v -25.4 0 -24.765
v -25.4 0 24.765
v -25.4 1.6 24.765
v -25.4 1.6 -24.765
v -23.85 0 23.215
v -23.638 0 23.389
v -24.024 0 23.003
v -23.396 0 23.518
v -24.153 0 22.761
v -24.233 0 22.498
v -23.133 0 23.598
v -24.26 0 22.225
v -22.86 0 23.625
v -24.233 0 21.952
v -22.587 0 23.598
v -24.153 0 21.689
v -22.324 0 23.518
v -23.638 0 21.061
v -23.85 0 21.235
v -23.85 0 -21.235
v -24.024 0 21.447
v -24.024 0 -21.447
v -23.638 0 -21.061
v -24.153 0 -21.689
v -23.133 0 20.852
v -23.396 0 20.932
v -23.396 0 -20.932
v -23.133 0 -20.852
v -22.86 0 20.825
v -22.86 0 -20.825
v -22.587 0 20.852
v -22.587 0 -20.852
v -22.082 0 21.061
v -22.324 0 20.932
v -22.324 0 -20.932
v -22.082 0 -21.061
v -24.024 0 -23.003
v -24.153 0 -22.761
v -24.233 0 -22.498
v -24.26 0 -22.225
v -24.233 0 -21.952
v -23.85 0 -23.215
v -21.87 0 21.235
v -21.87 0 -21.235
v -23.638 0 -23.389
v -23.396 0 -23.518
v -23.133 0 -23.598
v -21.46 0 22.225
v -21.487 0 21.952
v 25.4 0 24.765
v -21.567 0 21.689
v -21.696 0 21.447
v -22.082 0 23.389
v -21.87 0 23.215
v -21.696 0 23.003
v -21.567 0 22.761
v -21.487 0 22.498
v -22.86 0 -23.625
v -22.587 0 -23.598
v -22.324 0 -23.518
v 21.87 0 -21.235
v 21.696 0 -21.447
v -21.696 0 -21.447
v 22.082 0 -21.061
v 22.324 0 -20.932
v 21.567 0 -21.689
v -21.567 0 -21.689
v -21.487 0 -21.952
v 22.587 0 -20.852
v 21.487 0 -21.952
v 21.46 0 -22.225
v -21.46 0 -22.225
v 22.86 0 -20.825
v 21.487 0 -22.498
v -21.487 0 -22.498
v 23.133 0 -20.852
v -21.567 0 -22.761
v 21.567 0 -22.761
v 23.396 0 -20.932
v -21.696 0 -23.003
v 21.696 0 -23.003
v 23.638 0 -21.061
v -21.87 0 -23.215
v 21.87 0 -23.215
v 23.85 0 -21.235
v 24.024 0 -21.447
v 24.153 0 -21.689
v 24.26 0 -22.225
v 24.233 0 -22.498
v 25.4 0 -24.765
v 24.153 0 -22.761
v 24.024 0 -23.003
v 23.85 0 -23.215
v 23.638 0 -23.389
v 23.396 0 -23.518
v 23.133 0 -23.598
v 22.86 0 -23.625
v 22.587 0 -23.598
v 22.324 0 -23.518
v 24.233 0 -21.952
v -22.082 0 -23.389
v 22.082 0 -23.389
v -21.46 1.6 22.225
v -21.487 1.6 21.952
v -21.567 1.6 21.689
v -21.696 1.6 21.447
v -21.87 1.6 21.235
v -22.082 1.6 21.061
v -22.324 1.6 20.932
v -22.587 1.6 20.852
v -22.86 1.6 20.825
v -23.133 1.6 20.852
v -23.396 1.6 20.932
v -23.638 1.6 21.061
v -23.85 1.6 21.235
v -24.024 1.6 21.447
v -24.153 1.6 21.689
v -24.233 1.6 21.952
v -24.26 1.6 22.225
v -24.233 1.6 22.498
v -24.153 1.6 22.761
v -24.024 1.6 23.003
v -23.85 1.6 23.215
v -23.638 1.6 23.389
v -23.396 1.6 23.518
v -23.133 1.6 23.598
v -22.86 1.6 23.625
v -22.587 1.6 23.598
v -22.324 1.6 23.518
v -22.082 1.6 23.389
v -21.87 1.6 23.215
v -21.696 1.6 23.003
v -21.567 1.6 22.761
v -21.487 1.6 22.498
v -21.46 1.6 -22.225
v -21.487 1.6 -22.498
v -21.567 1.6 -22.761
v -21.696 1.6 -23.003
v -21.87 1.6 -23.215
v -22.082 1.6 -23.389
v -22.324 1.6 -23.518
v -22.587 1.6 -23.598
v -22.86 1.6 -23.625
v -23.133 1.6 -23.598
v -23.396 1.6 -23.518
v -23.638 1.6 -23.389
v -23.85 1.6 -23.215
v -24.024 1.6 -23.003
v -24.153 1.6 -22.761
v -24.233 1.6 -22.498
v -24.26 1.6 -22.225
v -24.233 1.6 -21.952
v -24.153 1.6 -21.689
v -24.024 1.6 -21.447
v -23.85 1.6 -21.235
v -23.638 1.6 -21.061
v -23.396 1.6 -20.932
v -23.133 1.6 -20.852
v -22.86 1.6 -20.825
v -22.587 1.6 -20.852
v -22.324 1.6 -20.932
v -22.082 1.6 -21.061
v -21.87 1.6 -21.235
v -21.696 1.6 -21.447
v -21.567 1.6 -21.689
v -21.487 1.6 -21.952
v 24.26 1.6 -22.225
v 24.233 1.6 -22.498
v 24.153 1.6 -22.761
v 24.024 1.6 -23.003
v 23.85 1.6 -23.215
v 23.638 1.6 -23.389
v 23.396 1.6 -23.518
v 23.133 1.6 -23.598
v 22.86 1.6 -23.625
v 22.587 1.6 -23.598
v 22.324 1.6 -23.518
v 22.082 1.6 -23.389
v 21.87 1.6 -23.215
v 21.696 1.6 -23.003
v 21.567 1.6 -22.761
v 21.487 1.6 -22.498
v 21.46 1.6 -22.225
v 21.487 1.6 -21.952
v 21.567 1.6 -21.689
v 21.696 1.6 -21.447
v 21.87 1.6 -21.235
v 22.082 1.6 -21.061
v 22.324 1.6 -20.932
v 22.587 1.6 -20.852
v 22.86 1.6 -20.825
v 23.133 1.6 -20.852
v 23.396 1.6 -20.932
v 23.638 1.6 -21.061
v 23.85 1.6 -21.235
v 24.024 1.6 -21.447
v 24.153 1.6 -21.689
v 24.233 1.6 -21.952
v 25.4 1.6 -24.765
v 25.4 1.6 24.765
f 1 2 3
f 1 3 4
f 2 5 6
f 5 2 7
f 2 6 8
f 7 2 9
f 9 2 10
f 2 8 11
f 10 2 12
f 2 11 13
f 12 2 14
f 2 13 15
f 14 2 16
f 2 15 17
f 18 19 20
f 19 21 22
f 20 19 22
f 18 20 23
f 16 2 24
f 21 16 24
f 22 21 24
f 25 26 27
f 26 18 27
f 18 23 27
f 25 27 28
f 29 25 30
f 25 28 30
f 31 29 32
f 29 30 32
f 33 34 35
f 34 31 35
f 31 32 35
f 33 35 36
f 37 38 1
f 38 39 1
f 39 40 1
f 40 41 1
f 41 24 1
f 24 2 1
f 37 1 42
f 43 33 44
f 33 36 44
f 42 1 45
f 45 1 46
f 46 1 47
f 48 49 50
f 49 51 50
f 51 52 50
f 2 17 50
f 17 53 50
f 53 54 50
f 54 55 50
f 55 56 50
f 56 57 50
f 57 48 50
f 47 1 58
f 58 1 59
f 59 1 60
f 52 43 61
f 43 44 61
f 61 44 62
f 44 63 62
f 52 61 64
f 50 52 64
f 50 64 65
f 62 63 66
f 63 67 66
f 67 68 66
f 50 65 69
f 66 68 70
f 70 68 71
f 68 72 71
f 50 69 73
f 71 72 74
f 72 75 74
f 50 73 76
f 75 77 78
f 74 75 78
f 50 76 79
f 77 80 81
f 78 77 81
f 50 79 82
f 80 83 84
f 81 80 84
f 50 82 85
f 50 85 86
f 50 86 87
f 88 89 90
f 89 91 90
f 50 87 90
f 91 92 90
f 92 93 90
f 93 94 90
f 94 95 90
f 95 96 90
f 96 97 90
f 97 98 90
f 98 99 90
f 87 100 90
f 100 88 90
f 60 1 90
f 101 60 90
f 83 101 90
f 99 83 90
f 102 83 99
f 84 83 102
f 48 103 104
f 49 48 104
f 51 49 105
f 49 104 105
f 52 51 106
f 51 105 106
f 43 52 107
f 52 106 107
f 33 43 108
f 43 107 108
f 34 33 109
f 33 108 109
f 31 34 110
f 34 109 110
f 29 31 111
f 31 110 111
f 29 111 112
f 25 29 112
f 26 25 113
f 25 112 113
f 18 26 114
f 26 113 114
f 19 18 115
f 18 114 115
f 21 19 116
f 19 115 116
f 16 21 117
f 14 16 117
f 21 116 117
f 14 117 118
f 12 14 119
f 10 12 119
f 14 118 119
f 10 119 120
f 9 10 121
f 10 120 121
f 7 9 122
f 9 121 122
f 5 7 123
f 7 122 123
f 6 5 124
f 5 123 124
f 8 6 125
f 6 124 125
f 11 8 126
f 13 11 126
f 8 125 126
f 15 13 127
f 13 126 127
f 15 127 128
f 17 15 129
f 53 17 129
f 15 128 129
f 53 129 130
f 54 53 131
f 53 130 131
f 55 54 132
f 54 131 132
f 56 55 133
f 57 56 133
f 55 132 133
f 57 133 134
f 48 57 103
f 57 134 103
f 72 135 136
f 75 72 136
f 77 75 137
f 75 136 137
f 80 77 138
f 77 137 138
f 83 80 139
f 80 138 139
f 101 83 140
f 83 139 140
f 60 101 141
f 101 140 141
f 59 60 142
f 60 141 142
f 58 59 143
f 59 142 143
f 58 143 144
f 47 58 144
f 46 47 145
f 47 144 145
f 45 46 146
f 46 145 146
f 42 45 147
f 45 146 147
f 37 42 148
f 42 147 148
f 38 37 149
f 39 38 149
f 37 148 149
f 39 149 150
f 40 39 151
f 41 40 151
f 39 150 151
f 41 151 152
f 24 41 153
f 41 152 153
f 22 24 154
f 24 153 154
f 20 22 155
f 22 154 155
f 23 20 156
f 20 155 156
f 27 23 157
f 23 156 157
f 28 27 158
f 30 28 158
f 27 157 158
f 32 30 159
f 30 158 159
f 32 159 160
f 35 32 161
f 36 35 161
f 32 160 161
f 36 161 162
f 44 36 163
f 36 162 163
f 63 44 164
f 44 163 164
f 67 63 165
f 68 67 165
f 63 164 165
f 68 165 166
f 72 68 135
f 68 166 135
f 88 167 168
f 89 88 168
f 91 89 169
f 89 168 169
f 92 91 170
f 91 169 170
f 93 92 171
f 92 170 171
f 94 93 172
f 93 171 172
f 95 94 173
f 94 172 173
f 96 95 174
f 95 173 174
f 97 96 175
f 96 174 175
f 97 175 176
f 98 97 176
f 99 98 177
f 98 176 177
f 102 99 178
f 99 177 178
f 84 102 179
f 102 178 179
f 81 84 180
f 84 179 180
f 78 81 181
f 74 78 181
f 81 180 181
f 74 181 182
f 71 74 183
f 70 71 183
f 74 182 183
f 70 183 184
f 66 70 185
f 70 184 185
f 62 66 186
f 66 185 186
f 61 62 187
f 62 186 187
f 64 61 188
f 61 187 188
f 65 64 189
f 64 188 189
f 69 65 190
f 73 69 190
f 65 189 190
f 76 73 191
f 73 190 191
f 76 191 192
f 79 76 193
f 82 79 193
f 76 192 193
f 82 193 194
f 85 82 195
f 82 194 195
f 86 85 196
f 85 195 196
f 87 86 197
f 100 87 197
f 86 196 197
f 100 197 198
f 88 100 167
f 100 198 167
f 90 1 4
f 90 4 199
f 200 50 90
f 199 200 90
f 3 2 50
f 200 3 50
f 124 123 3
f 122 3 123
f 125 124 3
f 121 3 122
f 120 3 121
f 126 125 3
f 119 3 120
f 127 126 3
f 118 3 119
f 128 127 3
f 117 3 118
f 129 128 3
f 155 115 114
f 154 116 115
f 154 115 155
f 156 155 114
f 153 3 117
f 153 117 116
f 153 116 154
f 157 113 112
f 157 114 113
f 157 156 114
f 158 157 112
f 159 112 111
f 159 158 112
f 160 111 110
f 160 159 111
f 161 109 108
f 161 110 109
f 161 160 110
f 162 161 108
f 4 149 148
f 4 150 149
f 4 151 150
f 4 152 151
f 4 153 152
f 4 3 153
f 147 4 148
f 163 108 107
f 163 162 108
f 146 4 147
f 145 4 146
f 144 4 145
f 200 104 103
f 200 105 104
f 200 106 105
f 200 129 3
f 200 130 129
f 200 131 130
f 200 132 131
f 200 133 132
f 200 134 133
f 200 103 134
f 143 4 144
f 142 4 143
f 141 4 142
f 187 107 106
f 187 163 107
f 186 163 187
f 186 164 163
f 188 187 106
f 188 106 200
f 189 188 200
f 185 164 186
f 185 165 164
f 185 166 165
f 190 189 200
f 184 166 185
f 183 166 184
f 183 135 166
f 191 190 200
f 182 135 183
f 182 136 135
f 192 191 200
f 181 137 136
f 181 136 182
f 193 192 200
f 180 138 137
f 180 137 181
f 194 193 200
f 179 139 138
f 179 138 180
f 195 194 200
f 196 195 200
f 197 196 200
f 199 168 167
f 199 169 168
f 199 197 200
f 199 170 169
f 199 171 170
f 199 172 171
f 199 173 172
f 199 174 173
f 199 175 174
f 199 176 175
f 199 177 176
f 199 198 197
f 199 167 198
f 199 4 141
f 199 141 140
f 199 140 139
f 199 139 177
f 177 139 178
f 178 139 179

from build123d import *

# Parameters (mm, degrees)
SKETCH2_W           = 50.8
SKETCH2_H           = 49.53
BOSS_EXTRUDE1_DEPTH = 1.6
SKETCH3_R           = 1.4
CUT_EXTRUDE1_DEPTH  = 1.6


with BuildPart() as part:
    # Sketch2 → Boss-Extrude1 (new body)
    with BuildSketch(Plane(origin=(0, 0, 0), x_dir=(1, 0, 0), z_dir=(0, 1, 0))):
        Rectangle(SKETCH2_W, SKETCH2_H)
    extrude(amount=BOSS_EXTRUDE1_DEPTH)

    # Sketch3 → Cut-Extrude1 (cut)
    with BuildSketch(Plane(origin=(0, 1.6, 0), x_dir=(1, 0, 0), z_dir=(0, 1, 0))):
        with Locations((-22.86, 22.225)):
            Circle(SKETCH3_R)
        with Locations((22.86, 22.225)):
            Circle(SKETCH3_R)
        with Locations((-22.86, -22.225)):
            Circle(SKETCH3_R)
    extrude(amount=-CUT_EXTRUDE1_DEPTH, mode=Mode.SUBTRACT)


solid = part.part
